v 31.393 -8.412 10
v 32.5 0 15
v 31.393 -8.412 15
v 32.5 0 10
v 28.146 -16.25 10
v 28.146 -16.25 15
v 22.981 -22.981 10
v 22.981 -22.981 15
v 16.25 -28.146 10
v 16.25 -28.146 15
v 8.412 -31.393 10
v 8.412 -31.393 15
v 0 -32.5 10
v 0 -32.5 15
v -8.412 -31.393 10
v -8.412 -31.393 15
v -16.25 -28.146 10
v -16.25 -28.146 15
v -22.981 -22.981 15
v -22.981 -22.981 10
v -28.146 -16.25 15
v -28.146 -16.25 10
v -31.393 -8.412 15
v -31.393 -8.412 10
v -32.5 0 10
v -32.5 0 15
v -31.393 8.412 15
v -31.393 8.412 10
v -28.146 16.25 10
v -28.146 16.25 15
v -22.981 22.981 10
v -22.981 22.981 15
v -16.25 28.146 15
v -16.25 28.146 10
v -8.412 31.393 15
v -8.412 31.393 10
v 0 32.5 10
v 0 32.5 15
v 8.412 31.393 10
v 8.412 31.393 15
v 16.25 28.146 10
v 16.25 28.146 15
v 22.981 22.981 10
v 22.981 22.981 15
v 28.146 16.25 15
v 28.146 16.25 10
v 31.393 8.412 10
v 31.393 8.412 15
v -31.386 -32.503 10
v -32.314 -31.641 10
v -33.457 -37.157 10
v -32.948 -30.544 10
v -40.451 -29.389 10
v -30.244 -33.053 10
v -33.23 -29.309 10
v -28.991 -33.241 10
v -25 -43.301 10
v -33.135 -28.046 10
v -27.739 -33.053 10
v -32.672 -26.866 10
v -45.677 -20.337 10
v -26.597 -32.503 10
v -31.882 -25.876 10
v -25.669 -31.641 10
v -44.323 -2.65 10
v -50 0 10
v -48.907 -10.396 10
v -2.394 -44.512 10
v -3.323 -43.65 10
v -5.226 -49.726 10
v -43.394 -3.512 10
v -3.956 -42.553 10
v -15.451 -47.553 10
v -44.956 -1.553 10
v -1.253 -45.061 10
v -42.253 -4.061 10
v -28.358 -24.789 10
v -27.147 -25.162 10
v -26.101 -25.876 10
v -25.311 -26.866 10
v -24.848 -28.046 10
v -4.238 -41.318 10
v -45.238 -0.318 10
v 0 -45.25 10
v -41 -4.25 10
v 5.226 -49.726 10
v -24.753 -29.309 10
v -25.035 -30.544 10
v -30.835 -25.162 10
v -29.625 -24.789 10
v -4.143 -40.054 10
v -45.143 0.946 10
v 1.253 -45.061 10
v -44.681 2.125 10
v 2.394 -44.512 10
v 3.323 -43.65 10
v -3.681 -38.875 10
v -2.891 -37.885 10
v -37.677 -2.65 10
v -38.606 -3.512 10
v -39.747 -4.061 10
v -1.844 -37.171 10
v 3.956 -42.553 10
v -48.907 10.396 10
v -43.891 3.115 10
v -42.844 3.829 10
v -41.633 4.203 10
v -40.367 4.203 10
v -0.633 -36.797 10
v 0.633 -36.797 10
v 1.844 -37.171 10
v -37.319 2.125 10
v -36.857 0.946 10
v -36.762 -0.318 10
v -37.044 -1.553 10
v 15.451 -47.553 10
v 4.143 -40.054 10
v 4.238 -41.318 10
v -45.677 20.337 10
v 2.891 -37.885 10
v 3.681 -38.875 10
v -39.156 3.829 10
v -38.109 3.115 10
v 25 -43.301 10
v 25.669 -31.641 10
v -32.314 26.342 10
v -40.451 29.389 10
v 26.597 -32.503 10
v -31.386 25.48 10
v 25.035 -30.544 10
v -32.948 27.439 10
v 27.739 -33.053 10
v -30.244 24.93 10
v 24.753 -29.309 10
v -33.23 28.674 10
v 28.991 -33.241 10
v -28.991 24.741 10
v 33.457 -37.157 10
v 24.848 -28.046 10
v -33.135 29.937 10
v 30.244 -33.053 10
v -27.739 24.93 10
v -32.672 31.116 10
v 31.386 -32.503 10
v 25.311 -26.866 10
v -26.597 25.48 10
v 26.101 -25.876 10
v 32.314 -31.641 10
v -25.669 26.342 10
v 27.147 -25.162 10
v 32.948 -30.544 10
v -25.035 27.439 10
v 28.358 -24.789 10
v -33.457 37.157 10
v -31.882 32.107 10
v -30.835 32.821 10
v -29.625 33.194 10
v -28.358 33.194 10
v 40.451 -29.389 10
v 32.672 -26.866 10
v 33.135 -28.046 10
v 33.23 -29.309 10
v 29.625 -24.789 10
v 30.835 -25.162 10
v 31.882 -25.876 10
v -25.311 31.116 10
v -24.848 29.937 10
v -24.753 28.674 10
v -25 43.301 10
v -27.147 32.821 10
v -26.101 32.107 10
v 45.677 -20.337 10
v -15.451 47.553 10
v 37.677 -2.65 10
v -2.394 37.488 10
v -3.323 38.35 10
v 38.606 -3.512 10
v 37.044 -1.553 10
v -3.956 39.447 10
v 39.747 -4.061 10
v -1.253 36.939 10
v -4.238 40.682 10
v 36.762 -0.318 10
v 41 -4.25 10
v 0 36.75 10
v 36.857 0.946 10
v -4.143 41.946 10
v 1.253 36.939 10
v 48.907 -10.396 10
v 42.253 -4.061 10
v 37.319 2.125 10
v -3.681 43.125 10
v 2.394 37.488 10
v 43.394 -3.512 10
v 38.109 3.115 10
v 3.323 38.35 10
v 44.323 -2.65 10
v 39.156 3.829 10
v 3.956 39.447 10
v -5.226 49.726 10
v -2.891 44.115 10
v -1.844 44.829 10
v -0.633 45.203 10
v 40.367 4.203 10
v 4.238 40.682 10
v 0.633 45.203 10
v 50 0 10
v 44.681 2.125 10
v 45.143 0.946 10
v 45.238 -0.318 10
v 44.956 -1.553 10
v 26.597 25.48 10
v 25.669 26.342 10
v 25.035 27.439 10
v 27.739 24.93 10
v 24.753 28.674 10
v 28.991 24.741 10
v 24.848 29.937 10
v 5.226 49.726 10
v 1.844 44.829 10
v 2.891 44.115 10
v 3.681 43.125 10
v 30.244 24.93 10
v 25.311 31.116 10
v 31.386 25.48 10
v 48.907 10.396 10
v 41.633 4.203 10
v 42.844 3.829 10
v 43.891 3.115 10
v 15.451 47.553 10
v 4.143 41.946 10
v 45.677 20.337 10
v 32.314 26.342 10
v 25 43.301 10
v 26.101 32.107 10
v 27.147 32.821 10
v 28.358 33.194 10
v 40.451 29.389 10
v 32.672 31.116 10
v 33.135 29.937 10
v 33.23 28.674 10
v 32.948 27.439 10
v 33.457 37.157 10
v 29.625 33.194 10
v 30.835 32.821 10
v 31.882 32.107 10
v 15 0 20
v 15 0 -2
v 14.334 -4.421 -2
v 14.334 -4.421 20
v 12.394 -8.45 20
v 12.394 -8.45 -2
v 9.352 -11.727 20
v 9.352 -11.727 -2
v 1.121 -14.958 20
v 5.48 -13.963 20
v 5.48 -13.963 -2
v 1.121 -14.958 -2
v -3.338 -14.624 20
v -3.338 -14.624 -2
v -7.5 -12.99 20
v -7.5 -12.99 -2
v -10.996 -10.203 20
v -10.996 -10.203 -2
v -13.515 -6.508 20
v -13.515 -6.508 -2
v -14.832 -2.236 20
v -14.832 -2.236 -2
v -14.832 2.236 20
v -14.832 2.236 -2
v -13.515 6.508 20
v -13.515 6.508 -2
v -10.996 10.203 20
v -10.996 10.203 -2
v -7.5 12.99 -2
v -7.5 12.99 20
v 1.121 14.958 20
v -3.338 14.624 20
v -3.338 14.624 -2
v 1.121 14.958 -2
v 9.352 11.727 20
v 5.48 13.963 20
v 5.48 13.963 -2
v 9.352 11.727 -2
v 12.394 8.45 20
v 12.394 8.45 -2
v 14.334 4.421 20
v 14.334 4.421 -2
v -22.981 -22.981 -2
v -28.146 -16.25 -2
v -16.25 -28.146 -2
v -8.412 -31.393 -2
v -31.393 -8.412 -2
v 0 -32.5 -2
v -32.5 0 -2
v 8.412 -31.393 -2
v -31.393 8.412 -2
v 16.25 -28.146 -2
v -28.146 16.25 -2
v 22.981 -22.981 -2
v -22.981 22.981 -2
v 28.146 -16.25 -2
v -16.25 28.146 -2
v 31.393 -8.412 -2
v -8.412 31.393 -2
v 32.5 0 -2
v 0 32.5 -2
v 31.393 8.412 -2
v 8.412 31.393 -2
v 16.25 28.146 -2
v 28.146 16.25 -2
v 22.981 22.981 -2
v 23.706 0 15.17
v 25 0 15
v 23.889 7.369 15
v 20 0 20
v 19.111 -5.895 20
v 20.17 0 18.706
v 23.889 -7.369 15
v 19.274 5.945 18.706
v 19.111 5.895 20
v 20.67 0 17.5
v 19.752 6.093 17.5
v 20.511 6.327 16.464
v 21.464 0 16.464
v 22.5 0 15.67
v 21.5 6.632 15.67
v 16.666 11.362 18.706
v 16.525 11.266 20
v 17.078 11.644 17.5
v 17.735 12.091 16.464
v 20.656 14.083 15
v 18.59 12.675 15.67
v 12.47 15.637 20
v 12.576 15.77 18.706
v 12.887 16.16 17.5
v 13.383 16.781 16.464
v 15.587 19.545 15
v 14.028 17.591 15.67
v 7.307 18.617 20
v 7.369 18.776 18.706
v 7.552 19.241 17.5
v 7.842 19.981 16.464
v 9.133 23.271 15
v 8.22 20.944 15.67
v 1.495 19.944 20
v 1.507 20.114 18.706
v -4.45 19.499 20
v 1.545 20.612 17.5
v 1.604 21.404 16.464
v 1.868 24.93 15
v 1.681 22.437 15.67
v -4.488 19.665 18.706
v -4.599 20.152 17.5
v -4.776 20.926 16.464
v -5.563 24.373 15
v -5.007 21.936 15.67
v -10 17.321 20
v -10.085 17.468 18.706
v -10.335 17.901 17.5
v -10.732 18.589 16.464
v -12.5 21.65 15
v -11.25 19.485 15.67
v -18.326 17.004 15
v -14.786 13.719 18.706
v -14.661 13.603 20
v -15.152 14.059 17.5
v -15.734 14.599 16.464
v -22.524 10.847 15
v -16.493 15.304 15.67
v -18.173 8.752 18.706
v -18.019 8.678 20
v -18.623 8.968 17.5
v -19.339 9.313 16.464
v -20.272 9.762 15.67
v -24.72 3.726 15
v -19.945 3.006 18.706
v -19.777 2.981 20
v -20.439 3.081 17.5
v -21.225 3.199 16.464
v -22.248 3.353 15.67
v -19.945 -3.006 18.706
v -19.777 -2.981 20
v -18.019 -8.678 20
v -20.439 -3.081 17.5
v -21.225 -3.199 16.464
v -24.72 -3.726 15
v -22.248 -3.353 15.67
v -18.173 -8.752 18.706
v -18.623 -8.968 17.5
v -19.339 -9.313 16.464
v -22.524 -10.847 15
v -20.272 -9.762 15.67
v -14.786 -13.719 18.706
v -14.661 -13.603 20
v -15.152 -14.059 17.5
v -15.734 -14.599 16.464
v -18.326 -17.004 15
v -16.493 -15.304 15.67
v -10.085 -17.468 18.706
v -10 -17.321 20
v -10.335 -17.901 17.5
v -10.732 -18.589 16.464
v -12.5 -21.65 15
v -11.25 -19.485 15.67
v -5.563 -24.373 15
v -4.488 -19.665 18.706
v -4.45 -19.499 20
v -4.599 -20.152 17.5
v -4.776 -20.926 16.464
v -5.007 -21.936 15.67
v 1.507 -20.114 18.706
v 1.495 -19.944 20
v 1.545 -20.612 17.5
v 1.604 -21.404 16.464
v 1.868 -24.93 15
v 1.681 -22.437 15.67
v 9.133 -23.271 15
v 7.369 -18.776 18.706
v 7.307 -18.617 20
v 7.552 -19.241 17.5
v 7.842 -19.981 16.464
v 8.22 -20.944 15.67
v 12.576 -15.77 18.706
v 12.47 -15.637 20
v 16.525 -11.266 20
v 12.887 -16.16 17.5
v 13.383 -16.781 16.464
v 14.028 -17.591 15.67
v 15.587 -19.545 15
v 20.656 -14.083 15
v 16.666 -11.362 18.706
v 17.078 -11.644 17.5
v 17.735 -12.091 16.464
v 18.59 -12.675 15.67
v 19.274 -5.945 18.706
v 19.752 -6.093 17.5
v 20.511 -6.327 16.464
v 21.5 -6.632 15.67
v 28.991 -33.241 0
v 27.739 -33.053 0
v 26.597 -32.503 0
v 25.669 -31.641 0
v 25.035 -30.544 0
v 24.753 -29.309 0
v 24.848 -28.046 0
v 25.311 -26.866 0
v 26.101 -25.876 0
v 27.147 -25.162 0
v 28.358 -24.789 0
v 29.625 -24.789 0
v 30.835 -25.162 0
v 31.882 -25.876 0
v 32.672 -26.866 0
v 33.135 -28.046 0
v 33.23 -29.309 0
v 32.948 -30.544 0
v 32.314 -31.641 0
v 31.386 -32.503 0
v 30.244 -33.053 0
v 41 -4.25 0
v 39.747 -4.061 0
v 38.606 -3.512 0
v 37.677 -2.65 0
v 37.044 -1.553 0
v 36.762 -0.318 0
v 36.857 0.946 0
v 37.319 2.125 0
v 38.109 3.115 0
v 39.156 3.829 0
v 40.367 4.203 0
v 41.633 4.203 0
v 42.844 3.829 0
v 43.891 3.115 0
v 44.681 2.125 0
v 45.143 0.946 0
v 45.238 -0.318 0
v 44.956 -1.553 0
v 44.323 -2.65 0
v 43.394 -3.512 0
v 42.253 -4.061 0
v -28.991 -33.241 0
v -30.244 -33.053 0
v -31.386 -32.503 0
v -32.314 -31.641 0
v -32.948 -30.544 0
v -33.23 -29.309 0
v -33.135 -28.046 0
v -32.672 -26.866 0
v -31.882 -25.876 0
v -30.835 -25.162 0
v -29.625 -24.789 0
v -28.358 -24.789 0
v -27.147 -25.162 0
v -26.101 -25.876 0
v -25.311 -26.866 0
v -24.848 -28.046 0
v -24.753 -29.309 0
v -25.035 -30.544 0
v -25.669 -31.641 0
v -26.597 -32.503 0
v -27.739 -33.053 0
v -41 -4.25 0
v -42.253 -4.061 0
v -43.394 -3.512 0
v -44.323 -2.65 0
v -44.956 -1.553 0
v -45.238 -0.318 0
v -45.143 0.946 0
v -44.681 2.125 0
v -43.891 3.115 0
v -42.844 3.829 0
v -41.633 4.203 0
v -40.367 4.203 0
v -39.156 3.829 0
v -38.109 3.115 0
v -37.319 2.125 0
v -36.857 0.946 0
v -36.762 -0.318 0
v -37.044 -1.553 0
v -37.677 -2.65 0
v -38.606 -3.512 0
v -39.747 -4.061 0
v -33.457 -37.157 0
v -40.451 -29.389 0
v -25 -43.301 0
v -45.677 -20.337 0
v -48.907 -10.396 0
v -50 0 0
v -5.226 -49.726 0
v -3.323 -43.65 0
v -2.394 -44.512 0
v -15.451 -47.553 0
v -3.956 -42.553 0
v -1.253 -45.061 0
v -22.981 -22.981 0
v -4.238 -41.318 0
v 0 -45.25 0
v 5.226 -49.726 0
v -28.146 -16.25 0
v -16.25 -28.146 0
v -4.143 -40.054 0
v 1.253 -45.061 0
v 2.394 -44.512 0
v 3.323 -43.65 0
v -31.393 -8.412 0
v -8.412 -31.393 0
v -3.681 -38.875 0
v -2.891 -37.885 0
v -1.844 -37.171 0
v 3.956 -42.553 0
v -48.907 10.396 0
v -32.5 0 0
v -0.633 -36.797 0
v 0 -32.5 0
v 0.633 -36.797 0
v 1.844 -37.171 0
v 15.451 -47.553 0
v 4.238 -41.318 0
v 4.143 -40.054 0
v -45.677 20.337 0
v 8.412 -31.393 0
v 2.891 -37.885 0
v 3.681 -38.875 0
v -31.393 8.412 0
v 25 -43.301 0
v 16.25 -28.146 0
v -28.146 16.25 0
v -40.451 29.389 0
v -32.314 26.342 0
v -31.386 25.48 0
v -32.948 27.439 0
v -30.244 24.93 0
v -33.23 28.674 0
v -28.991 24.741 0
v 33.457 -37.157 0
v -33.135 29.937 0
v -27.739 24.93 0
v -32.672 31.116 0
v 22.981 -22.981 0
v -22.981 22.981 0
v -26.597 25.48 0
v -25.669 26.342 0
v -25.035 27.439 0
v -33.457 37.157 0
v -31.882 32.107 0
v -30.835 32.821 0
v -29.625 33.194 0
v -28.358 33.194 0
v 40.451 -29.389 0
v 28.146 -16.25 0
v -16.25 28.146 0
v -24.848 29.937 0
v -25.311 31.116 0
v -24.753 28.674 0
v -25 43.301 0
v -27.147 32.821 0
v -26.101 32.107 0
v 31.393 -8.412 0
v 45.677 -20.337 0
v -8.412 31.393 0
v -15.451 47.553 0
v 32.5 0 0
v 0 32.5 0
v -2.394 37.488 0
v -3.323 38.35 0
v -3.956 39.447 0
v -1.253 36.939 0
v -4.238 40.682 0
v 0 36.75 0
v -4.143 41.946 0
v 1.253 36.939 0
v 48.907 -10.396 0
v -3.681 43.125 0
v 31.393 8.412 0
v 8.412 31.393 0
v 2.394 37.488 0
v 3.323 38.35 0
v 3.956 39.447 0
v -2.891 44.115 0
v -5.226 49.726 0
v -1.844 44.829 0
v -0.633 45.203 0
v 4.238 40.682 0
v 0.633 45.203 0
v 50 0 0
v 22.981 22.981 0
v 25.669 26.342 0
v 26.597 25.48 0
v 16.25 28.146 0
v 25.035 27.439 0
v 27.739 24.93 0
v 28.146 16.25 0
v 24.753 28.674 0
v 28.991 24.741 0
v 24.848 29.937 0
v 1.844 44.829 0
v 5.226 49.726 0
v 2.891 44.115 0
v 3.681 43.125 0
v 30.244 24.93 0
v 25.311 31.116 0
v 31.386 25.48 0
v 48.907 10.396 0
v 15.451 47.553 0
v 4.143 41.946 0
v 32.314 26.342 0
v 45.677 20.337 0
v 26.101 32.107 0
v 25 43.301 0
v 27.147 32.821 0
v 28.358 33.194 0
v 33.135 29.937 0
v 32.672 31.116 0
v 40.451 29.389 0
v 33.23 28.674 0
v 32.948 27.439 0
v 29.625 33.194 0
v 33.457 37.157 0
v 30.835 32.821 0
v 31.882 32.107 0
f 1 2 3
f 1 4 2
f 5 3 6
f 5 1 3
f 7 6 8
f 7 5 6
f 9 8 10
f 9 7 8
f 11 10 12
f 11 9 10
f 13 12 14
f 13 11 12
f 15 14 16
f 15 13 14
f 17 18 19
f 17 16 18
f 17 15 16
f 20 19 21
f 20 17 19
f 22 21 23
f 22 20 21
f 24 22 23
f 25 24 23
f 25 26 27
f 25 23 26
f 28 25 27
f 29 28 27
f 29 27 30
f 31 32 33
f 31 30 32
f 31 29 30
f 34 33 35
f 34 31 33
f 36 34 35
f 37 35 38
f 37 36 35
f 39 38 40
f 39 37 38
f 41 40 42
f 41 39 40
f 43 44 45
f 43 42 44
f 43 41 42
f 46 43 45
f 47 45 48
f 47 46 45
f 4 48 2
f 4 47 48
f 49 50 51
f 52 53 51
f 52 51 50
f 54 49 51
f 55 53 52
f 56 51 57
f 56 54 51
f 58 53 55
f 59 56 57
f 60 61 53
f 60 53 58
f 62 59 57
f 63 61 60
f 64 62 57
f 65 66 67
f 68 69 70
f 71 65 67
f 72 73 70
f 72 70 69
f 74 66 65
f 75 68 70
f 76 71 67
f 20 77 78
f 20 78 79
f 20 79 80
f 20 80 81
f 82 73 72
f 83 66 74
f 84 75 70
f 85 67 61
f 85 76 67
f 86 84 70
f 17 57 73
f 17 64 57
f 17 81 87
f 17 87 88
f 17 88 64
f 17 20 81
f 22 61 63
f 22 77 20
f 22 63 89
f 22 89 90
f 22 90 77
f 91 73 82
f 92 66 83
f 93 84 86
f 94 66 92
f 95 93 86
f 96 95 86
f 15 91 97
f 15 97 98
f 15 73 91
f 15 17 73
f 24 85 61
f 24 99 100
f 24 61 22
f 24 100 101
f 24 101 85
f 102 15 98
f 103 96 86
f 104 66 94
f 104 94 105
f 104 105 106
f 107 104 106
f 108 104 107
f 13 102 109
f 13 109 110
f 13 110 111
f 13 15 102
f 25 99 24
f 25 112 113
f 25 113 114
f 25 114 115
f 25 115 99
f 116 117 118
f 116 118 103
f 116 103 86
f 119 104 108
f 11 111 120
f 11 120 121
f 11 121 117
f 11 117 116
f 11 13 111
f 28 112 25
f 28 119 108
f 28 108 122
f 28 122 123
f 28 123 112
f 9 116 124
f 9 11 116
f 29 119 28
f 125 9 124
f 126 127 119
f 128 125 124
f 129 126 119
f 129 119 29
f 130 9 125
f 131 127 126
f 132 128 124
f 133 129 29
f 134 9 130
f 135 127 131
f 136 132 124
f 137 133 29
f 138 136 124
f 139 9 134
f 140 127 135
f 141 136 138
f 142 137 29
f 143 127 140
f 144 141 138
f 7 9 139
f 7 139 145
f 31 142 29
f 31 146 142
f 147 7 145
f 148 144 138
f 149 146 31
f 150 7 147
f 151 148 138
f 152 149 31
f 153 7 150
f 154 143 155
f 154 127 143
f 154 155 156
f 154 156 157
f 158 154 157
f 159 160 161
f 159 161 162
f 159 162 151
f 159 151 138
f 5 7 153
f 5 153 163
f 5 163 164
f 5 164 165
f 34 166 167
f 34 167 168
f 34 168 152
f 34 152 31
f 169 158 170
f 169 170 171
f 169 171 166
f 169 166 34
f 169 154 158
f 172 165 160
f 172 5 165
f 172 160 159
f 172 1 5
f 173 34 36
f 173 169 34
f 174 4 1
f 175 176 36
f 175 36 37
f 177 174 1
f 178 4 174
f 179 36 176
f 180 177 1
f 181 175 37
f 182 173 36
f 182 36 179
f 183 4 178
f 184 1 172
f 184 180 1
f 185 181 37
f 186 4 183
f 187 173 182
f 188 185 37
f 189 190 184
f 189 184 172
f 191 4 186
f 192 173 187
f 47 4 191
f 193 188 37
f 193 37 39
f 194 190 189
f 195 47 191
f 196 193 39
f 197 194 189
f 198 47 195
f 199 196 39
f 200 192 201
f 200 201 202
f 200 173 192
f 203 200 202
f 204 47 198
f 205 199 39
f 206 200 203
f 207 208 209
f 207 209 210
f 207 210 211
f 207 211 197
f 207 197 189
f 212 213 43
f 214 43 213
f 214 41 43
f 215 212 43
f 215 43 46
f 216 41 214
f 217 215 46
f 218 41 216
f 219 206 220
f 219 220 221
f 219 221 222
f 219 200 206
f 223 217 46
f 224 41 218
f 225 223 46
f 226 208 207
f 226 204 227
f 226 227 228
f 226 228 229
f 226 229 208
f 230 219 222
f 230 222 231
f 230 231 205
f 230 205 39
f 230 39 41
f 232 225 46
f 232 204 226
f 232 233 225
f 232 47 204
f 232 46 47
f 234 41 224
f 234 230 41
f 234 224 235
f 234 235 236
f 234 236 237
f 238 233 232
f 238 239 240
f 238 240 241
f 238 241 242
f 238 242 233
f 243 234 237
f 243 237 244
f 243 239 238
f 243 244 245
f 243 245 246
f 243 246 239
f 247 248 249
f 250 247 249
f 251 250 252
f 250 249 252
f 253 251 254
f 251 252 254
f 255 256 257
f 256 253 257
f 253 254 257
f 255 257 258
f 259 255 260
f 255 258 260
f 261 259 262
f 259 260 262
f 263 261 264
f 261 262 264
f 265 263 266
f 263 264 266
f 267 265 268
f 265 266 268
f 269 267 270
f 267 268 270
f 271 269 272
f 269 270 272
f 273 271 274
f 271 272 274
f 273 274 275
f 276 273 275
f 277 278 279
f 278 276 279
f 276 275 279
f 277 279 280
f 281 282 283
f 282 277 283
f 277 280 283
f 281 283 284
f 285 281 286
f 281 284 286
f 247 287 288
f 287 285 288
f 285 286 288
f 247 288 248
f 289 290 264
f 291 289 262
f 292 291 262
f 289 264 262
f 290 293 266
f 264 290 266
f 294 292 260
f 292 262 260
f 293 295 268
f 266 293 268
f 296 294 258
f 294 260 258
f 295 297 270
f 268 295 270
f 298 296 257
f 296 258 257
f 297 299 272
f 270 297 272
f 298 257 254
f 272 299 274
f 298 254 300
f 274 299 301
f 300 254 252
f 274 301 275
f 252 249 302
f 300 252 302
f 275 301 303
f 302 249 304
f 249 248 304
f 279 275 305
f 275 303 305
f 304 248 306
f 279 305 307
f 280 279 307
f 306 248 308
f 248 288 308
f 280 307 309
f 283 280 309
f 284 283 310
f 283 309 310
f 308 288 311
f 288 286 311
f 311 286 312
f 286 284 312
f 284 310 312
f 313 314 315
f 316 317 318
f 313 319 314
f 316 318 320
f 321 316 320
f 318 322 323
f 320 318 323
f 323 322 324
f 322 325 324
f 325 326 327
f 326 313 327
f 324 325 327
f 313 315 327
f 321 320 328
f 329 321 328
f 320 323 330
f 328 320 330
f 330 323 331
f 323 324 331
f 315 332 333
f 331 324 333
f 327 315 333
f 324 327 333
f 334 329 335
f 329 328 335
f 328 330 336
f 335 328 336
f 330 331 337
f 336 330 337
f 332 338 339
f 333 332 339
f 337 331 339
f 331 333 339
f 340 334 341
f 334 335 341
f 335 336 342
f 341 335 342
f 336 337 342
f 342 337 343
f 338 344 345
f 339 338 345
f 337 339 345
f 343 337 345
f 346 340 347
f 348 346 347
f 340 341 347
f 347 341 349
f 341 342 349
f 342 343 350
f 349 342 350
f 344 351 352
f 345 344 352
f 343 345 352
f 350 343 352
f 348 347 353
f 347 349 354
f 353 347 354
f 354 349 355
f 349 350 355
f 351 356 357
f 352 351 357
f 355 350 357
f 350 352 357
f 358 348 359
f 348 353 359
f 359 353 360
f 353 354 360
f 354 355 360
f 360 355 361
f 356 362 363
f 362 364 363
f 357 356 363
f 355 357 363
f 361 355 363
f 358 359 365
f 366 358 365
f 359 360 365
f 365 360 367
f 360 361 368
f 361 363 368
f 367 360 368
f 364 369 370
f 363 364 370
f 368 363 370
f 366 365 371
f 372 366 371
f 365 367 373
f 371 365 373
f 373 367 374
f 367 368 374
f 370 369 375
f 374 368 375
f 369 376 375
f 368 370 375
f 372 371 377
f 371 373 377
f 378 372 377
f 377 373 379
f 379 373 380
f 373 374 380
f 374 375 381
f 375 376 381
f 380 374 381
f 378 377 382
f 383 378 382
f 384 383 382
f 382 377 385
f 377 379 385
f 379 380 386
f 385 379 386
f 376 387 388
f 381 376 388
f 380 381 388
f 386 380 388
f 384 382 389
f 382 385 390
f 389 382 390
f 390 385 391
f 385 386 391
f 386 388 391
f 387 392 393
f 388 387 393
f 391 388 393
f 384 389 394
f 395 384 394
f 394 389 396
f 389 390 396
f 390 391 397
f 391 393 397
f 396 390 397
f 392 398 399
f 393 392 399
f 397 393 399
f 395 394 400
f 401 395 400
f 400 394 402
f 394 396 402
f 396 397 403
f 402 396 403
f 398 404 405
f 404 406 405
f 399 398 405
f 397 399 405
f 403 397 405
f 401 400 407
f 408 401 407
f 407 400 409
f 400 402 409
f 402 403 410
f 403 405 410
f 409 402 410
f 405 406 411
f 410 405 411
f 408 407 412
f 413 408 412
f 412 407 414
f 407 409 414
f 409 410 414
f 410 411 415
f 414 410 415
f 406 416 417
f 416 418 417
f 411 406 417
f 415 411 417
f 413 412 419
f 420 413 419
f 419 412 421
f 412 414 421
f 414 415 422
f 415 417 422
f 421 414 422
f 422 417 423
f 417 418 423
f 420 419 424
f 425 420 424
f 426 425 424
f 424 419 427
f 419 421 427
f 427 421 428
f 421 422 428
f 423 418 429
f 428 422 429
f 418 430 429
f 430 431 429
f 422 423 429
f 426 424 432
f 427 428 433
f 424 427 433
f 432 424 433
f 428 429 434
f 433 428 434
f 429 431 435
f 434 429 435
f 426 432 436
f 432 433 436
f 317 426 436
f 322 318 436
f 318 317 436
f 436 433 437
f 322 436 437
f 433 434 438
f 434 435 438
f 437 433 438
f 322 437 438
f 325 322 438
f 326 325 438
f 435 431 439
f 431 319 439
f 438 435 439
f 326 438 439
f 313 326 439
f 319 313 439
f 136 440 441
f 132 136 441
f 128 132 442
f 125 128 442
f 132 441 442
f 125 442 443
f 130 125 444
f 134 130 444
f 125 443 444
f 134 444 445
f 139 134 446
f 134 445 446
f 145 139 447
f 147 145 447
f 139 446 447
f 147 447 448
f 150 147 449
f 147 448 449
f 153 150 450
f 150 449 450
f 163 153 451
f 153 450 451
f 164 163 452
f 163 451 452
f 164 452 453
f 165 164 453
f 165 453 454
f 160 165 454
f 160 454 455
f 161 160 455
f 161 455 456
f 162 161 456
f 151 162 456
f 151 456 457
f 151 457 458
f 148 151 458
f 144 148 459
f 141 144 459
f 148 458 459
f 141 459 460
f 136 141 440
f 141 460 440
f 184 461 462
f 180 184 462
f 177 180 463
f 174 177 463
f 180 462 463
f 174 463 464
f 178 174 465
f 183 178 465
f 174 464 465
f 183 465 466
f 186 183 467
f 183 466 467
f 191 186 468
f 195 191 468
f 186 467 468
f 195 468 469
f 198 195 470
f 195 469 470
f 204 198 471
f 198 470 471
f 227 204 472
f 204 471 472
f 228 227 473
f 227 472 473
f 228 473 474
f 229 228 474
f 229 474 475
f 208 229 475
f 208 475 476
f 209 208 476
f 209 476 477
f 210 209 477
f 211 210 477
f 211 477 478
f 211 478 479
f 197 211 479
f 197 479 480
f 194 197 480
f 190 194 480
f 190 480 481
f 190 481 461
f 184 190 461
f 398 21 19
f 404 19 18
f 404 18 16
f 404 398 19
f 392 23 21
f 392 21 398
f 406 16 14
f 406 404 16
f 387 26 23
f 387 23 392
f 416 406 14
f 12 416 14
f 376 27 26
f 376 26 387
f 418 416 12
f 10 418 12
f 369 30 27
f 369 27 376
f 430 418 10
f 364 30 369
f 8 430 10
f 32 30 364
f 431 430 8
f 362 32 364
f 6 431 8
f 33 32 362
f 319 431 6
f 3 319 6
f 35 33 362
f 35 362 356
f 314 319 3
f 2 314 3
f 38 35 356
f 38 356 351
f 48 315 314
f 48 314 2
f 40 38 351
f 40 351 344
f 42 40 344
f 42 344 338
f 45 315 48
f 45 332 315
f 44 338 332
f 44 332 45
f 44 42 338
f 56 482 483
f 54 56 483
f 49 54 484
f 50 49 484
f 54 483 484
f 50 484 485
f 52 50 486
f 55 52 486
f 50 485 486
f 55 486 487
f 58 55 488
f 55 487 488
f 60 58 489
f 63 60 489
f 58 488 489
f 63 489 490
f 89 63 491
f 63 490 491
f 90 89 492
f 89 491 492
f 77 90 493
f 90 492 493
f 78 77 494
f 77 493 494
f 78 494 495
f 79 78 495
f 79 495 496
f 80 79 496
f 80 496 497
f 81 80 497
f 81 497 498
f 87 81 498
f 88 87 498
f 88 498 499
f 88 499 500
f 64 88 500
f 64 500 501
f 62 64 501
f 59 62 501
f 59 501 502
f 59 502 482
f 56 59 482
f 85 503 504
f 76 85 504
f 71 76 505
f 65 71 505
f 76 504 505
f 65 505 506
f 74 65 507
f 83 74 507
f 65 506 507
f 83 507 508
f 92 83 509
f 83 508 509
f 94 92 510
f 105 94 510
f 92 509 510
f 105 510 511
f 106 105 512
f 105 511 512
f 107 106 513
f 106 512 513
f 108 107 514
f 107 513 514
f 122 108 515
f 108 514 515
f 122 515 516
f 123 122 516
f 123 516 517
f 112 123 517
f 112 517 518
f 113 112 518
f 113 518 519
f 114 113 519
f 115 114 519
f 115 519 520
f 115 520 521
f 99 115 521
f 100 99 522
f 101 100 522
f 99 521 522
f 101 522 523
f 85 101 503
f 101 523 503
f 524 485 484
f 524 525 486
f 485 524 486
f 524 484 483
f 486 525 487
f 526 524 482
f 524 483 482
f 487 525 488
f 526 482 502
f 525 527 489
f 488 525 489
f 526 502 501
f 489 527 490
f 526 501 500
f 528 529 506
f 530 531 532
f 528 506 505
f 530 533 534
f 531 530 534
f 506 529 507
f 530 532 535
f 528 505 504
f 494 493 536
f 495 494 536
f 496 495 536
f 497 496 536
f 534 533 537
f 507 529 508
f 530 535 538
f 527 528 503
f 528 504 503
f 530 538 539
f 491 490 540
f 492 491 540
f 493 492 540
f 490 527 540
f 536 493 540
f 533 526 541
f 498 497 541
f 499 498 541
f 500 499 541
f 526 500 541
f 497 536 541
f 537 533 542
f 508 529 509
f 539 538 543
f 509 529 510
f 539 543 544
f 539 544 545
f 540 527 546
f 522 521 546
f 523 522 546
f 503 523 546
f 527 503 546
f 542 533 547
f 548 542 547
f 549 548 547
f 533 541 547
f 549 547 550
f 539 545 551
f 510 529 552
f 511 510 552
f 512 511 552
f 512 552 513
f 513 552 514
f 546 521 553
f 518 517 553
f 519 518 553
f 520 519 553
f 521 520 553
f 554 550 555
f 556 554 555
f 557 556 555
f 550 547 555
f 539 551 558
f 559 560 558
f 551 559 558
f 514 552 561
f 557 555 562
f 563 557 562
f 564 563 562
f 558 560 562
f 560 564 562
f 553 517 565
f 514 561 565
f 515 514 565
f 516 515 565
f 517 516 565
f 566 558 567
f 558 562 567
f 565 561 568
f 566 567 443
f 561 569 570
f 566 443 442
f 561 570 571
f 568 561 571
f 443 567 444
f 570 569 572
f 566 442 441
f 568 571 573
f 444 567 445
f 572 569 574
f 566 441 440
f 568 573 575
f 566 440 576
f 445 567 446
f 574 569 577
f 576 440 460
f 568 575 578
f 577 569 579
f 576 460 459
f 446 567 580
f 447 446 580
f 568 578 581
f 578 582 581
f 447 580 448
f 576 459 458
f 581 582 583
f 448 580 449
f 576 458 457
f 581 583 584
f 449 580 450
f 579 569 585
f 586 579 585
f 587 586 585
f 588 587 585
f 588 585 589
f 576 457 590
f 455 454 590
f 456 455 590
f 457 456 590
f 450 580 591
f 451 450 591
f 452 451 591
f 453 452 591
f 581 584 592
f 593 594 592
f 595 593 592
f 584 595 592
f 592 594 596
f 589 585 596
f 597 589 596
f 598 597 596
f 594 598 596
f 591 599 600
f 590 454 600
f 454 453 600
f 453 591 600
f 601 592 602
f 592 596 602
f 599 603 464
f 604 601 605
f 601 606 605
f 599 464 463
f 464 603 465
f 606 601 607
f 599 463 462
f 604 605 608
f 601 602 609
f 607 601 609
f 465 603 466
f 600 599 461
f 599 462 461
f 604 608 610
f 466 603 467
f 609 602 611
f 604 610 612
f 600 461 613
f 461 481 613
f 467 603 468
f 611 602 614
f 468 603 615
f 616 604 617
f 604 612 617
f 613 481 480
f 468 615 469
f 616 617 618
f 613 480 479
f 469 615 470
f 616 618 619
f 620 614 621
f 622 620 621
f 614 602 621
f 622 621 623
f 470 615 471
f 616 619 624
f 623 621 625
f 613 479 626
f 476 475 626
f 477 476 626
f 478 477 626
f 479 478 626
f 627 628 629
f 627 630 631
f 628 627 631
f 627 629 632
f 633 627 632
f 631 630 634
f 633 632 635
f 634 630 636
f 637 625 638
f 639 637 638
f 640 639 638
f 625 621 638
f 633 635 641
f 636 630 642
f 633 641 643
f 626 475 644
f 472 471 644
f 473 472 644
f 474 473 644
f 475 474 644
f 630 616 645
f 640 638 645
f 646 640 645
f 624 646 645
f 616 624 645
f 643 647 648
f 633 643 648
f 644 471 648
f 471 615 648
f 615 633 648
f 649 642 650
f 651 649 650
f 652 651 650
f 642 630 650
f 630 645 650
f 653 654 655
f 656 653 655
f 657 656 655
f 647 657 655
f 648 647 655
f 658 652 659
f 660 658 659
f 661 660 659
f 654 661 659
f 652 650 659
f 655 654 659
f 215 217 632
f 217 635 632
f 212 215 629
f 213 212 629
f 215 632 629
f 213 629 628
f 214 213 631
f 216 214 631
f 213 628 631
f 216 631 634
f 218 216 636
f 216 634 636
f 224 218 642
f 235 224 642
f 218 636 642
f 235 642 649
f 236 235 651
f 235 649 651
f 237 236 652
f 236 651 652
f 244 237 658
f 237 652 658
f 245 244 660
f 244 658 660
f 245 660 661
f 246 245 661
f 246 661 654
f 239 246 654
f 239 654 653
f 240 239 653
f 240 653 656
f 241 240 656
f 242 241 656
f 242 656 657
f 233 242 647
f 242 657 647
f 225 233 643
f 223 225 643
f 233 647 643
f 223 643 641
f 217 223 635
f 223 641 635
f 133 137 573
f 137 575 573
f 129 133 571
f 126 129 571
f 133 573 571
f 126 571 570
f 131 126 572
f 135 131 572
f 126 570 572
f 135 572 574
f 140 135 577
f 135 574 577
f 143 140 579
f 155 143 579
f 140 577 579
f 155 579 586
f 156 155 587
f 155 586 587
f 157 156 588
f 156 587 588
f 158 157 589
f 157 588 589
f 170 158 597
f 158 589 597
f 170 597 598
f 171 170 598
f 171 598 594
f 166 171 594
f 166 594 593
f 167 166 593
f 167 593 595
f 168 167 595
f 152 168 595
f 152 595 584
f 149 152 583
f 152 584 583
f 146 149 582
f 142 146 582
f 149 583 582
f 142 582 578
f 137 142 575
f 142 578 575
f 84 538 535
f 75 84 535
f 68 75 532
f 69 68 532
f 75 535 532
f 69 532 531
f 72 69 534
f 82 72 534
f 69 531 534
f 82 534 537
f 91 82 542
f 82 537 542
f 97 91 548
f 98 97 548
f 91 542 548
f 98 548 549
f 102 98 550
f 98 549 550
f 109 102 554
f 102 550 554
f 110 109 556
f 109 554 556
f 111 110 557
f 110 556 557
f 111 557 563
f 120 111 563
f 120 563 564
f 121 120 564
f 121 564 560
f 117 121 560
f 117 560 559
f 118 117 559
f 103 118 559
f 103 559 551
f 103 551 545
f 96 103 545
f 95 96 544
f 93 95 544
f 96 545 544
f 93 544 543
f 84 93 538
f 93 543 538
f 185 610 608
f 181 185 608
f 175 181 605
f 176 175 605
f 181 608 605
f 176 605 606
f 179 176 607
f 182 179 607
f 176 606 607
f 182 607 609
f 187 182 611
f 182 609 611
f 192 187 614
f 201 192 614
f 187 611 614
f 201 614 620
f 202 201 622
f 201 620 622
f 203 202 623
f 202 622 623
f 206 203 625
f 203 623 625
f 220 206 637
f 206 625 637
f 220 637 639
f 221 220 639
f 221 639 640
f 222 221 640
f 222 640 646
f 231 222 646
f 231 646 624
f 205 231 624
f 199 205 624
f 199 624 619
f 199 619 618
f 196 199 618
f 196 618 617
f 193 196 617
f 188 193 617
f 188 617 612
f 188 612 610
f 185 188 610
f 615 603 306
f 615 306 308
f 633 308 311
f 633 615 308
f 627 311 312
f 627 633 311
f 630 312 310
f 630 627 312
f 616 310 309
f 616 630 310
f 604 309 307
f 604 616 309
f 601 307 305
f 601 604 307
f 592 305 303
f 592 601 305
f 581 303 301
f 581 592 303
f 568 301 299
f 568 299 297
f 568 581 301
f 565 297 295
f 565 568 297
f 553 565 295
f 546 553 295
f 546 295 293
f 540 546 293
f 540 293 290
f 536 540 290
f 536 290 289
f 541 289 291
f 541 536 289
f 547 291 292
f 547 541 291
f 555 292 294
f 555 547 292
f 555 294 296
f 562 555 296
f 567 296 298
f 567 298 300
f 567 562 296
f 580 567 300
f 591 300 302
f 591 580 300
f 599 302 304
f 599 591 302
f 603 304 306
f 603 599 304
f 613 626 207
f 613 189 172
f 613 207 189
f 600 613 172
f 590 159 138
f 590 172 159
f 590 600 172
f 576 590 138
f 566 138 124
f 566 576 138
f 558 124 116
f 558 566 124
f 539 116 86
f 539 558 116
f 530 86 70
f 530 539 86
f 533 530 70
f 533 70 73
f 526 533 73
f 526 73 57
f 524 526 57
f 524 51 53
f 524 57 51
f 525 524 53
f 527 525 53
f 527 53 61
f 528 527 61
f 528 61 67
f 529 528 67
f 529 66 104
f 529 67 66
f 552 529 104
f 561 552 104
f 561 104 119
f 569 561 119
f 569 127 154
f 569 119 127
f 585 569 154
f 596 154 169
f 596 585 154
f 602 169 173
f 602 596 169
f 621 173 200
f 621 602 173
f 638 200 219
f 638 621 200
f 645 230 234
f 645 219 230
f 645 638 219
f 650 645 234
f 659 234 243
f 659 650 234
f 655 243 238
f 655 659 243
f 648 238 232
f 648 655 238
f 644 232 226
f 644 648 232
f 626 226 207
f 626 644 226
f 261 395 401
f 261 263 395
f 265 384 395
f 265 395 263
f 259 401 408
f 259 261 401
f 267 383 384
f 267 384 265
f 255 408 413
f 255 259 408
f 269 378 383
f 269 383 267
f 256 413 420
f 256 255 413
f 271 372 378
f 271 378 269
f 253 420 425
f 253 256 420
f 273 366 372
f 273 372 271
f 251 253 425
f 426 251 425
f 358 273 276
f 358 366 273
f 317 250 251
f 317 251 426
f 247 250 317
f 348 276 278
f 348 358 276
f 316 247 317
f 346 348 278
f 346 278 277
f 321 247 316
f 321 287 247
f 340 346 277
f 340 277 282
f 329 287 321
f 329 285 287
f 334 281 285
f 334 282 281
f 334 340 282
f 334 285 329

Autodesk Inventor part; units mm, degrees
ref_plane "YZ Plane" through (0, 0, 0) normal (1, 0, 0) x (0, 1, 0)
ref_plane "XZ Plane" through (0, 0, 0) normal (0, 1, 0) x (-1, 0, 0)
ref_plane "XY Plane" through (0, 0, 0) normal (0, 0, 1) x (1, 0, 0)
sketch "Sketch1" plane through (0, 0, 0) normal (0, 0, 1) x (1, 0, 0)
  circle A0 centre (0, 0) radius 15
  circle A1 centre (0, 0) radius 20
  circle A2 centre (0, 0) radius 32.5
  circle A3 centre (0, 0) radius 50
  dimension "d0" = 30
  dimension "d1" = 40
  dimension "d2" = 65
  dimension "d3" = 100
extrude "Extrusion1" add sketch "Sketch1" along normal blind 10 contours A2 | A3
extrude "Extrusion2" add sketch "Sketch1" along normal blind 20 contours A1
extrude "Extrusion3" add sketch "Sketch1" along normal blind 15 contours A2
fillet "Fillet1" radius 5 1 edges at (-20, 0, 15)
extrude "Extrusion4" add sketch "Sketch1" against normal blind 2 contours A1 | A2
sketch "Sketch2" plane through (0, 0, 10) normal (0, 0, 1) x (1, 0, 0)
  point P0 (0, 0)
  point P1 (0, 41)
  point P2 (28.9914, 28.9914)
  point P3 (41, 0)
  point P4 (28.9914, -28.9914)
  point P5 (0, -41)
  point P6 (-28.9914, -28.9914)
  point P7 (-41, 0)
  point P8 (-28.9914, 28.9914)
  dimension "d13" = 41
  dimension "d16" = 360
hole "Hole1" at (0, 41, 10) at (28.9914, 28.9914, 10) at (41, 0, 10) at (28.9914, -28.9914, 10) at (0, -41, 10) at (-28.9914, -28.9914, 10) at (-41, 0, 10) at (-28.9914, 28.9914, 10) direction (0, 0, -1) diameter 8.5 depth 26 tip angle 118
properties part number "Part11_CPY"
